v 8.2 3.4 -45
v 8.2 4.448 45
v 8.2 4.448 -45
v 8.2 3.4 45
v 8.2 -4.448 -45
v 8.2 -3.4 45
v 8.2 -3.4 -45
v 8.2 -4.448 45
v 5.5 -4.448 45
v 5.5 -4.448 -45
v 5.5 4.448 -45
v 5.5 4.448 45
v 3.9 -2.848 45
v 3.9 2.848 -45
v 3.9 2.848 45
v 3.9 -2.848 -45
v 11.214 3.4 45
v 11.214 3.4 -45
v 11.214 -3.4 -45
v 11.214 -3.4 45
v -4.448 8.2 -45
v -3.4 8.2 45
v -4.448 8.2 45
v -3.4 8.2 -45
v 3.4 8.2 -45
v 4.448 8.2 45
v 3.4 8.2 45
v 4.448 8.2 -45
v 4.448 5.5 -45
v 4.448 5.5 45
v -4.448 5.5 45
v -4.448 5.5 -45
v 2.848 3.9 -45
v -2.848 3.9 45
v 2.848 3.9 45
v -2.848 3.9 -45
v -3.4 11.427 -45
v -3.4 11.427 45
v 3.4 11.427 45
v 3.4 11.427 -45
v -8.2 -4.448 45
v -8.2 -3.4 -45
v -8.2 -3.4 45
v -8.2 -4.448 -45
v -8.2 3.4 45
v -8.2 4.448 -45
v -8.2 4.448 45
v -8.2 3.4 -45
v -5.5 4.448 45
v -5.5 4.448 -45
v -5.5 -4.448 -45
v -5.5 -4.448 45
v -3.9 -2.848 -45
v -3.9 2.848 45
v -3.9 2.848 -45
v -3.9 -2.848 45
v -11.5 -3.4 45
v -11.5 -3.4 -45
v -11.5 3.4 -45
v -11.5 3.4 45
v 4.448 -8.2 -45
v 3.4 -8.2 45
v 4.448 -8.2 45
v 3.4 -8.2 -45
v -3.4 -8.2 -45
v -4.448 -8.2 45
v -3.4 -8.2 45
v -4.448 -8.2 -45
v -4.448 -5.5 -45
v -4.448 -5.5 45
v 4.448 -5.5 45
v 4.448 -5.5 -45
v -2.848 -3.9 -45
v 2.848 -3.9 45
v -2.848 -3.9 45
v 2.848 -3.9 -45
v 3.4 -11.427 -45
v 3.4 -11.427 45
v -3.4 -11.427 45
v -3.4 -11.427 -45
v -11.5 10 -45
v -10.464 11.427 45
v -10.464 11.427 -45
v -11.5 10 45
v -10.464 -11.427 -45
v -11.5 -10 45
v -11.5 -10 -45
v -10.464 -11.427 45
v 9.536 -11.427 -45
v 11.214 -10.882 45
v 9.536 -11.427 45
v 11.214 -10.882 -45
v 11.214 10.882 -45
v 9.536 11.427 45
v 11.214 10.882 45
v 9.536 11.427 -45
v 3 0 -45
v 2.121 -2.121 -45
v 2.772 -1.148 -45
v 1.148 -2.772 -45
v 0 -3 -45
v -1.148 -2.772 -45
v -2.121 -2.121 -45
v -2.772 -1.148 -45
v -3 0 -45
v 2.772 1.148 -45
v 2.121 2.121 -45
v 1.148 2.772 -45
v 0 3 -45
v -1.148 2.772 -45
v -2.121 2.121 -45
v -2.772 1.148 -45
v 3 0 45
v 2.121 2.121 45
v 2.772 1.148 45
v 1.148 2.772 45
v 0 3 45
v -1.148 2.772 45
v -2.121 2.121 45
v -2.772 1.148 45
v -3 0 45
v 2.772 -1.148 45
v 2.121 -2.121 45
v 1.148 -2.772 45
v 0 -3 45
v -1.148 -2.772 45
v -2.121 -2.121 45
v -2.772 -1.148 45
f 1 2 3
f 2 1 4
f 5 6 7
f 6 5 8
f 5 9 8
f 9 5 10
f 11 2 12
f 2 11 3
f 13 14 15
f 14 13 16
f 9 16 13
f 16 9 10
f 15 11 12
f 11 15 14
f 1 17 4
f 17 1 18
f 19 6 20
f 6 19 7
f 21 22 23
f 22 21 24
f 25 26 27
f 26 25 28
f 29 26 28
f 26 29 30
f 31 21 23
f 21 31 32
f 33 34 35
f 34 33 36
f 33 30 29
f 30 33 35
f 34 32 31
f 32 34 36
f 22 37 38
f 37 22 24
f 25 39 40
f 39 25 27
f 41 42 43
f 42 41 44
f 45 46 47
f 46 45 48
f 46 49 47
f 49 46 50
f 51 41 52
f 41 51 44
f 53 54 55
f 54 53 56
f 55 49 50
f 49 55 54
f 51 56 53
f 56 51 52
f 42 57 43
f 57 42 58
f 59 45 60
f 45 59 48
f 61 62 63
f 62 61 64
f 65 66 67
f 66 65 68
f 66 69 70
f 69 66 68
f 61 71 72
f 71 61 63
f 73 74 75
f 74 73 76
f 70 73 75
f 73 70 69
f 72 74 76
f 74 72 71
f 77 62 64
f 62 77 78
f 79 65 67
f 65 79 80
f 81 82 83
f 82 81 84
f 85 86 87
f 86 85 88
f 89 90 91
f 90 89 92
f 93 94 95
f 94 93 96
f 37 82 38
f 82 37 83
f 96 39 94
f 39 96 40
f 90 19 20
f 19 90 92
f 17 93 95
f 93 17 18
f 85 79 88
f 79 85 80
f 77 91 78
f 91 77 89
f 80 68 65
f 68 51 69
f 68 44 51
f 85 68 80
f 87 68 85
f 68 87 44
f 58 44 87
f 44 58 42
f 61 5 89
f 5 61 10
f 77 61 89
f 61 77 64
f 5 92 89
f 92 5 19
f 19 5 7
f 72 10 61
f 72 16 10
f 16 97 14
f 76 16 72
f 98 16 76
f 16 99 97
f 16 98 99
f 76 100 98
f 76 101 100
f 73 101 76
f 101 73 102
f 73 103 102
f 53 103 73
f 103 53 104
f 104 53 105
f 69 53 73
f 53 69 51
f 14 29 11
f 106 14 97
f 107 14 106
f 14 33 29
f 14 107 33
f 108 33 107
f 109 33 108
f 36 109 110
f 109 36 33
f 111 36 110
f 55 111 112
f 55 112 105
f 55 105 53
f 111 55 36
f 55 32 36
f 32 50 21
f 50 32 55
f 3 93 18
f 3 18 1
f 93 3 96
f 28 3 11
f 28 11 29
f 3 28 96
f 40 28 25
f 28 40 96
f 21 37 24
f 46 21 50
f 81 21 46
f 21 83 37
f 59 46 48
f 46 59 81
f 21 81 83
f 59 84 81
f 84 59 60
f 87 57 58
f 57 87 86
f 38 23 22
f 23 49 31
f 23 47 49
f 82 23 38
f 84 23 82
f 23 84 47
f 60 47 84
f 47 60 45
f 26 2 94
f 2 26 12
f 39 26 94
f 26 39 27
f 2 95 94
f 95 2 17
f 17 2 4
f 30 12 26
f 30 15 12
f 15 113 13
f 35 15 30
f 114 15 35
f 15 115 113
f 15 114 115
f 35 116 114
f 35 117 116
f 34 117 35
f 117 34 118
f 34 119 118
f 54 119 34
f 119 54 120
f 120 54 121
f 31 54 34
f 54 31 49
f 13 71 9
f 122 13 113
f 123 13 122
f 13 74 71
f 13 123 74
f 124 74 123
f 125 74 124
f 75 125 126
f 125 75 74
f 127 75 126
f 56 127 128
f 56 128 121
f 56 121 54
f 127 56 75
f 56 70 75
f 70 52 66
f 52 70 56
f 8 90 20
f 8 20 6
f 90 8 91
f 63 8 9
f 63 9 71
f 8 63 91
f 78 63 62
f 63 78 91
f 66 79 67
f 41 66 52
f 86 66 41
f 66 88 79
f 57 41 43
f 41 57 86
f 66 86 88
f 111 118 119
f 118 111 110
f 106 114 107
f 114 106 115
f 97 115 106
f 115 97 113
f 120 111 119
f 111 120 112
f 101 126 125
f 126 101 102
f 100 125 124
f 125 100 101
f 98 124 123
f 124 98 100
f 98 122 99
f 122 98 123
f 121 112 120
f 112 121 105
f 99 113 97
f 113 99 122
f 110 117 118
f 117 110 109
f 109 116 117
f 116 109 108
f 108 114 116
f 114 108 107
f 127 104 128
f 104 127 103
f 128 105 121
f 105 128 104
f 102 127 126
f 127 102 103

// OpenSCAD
 extr=20; h = 3*extr; w = h; diagonal = extr*sqrt(2); thickness=3.6; 
 rear_hole_dist=extr/2; screw_hole=3.2; forward_hole_dist=5; frame_type=0; layer_h=0.4;
 // extrusion dimmensions
extr = 20; //15 - 20 for 20x20 extrusion
extr_tslot = 6.8; //3.2 6.8 for 20x20 extrusion
extr_tslot_depth =6.1; // for 20x20
extr_nut = 11; //5.8 11 for 20x20 extrusion
extr_corn = (extr - extr_tslot)/2;
diagonal=extr*sqrt(2);
extr_type=1;
r=1.5;


module extrusion (h, extr,extr_type)
  {
     difference() {
       rotate([0,90,0])
       minkowski() {
         cube([h/2,extr,extr],center=true);
         rotate([0,90,0]) cylinder(r=r,h=h,center=true);
       }
       
      difference (){ 
         for (i=[00:90:359])
           rotate ([0,0,i]) {
             intersection (){
               cube([extr-1.8*2,extr-1.8*2,h*2],center=true);
                 #minkowski()
                  {                 
                   #intersection(){
                    translate([extr_tslot,0,0]) cube([extr_tslot*2,extr_nut,h*2],center=true);
                     difference(){
                       translate([(extr/2-1.8/4),0,0])
                         rotate ([0,0,45])
                           cube ([extr/2,extr/2,h*2],center=true);
                     cube([extr-extr_tslot_depth*2,extr-extr_tslot_depth*2,h*2 ],center=true);
                     }
                     cube([extr_nut,extr_nut,h*3],center=true);
                     } 
                     rotate([0,90,0]) cylinder(r=r,h=h*2);
                    }
               } 
              translate([extr/2,0,0]) cube ([extr_tslot,extr_tslot,h*2],center=true);
           }
          
      }
      cylinder(r=6/2, h=h*2, center=true, $fn=16);
     }
  }
//
 
 extrusion(h, extr, extr_type);

  
